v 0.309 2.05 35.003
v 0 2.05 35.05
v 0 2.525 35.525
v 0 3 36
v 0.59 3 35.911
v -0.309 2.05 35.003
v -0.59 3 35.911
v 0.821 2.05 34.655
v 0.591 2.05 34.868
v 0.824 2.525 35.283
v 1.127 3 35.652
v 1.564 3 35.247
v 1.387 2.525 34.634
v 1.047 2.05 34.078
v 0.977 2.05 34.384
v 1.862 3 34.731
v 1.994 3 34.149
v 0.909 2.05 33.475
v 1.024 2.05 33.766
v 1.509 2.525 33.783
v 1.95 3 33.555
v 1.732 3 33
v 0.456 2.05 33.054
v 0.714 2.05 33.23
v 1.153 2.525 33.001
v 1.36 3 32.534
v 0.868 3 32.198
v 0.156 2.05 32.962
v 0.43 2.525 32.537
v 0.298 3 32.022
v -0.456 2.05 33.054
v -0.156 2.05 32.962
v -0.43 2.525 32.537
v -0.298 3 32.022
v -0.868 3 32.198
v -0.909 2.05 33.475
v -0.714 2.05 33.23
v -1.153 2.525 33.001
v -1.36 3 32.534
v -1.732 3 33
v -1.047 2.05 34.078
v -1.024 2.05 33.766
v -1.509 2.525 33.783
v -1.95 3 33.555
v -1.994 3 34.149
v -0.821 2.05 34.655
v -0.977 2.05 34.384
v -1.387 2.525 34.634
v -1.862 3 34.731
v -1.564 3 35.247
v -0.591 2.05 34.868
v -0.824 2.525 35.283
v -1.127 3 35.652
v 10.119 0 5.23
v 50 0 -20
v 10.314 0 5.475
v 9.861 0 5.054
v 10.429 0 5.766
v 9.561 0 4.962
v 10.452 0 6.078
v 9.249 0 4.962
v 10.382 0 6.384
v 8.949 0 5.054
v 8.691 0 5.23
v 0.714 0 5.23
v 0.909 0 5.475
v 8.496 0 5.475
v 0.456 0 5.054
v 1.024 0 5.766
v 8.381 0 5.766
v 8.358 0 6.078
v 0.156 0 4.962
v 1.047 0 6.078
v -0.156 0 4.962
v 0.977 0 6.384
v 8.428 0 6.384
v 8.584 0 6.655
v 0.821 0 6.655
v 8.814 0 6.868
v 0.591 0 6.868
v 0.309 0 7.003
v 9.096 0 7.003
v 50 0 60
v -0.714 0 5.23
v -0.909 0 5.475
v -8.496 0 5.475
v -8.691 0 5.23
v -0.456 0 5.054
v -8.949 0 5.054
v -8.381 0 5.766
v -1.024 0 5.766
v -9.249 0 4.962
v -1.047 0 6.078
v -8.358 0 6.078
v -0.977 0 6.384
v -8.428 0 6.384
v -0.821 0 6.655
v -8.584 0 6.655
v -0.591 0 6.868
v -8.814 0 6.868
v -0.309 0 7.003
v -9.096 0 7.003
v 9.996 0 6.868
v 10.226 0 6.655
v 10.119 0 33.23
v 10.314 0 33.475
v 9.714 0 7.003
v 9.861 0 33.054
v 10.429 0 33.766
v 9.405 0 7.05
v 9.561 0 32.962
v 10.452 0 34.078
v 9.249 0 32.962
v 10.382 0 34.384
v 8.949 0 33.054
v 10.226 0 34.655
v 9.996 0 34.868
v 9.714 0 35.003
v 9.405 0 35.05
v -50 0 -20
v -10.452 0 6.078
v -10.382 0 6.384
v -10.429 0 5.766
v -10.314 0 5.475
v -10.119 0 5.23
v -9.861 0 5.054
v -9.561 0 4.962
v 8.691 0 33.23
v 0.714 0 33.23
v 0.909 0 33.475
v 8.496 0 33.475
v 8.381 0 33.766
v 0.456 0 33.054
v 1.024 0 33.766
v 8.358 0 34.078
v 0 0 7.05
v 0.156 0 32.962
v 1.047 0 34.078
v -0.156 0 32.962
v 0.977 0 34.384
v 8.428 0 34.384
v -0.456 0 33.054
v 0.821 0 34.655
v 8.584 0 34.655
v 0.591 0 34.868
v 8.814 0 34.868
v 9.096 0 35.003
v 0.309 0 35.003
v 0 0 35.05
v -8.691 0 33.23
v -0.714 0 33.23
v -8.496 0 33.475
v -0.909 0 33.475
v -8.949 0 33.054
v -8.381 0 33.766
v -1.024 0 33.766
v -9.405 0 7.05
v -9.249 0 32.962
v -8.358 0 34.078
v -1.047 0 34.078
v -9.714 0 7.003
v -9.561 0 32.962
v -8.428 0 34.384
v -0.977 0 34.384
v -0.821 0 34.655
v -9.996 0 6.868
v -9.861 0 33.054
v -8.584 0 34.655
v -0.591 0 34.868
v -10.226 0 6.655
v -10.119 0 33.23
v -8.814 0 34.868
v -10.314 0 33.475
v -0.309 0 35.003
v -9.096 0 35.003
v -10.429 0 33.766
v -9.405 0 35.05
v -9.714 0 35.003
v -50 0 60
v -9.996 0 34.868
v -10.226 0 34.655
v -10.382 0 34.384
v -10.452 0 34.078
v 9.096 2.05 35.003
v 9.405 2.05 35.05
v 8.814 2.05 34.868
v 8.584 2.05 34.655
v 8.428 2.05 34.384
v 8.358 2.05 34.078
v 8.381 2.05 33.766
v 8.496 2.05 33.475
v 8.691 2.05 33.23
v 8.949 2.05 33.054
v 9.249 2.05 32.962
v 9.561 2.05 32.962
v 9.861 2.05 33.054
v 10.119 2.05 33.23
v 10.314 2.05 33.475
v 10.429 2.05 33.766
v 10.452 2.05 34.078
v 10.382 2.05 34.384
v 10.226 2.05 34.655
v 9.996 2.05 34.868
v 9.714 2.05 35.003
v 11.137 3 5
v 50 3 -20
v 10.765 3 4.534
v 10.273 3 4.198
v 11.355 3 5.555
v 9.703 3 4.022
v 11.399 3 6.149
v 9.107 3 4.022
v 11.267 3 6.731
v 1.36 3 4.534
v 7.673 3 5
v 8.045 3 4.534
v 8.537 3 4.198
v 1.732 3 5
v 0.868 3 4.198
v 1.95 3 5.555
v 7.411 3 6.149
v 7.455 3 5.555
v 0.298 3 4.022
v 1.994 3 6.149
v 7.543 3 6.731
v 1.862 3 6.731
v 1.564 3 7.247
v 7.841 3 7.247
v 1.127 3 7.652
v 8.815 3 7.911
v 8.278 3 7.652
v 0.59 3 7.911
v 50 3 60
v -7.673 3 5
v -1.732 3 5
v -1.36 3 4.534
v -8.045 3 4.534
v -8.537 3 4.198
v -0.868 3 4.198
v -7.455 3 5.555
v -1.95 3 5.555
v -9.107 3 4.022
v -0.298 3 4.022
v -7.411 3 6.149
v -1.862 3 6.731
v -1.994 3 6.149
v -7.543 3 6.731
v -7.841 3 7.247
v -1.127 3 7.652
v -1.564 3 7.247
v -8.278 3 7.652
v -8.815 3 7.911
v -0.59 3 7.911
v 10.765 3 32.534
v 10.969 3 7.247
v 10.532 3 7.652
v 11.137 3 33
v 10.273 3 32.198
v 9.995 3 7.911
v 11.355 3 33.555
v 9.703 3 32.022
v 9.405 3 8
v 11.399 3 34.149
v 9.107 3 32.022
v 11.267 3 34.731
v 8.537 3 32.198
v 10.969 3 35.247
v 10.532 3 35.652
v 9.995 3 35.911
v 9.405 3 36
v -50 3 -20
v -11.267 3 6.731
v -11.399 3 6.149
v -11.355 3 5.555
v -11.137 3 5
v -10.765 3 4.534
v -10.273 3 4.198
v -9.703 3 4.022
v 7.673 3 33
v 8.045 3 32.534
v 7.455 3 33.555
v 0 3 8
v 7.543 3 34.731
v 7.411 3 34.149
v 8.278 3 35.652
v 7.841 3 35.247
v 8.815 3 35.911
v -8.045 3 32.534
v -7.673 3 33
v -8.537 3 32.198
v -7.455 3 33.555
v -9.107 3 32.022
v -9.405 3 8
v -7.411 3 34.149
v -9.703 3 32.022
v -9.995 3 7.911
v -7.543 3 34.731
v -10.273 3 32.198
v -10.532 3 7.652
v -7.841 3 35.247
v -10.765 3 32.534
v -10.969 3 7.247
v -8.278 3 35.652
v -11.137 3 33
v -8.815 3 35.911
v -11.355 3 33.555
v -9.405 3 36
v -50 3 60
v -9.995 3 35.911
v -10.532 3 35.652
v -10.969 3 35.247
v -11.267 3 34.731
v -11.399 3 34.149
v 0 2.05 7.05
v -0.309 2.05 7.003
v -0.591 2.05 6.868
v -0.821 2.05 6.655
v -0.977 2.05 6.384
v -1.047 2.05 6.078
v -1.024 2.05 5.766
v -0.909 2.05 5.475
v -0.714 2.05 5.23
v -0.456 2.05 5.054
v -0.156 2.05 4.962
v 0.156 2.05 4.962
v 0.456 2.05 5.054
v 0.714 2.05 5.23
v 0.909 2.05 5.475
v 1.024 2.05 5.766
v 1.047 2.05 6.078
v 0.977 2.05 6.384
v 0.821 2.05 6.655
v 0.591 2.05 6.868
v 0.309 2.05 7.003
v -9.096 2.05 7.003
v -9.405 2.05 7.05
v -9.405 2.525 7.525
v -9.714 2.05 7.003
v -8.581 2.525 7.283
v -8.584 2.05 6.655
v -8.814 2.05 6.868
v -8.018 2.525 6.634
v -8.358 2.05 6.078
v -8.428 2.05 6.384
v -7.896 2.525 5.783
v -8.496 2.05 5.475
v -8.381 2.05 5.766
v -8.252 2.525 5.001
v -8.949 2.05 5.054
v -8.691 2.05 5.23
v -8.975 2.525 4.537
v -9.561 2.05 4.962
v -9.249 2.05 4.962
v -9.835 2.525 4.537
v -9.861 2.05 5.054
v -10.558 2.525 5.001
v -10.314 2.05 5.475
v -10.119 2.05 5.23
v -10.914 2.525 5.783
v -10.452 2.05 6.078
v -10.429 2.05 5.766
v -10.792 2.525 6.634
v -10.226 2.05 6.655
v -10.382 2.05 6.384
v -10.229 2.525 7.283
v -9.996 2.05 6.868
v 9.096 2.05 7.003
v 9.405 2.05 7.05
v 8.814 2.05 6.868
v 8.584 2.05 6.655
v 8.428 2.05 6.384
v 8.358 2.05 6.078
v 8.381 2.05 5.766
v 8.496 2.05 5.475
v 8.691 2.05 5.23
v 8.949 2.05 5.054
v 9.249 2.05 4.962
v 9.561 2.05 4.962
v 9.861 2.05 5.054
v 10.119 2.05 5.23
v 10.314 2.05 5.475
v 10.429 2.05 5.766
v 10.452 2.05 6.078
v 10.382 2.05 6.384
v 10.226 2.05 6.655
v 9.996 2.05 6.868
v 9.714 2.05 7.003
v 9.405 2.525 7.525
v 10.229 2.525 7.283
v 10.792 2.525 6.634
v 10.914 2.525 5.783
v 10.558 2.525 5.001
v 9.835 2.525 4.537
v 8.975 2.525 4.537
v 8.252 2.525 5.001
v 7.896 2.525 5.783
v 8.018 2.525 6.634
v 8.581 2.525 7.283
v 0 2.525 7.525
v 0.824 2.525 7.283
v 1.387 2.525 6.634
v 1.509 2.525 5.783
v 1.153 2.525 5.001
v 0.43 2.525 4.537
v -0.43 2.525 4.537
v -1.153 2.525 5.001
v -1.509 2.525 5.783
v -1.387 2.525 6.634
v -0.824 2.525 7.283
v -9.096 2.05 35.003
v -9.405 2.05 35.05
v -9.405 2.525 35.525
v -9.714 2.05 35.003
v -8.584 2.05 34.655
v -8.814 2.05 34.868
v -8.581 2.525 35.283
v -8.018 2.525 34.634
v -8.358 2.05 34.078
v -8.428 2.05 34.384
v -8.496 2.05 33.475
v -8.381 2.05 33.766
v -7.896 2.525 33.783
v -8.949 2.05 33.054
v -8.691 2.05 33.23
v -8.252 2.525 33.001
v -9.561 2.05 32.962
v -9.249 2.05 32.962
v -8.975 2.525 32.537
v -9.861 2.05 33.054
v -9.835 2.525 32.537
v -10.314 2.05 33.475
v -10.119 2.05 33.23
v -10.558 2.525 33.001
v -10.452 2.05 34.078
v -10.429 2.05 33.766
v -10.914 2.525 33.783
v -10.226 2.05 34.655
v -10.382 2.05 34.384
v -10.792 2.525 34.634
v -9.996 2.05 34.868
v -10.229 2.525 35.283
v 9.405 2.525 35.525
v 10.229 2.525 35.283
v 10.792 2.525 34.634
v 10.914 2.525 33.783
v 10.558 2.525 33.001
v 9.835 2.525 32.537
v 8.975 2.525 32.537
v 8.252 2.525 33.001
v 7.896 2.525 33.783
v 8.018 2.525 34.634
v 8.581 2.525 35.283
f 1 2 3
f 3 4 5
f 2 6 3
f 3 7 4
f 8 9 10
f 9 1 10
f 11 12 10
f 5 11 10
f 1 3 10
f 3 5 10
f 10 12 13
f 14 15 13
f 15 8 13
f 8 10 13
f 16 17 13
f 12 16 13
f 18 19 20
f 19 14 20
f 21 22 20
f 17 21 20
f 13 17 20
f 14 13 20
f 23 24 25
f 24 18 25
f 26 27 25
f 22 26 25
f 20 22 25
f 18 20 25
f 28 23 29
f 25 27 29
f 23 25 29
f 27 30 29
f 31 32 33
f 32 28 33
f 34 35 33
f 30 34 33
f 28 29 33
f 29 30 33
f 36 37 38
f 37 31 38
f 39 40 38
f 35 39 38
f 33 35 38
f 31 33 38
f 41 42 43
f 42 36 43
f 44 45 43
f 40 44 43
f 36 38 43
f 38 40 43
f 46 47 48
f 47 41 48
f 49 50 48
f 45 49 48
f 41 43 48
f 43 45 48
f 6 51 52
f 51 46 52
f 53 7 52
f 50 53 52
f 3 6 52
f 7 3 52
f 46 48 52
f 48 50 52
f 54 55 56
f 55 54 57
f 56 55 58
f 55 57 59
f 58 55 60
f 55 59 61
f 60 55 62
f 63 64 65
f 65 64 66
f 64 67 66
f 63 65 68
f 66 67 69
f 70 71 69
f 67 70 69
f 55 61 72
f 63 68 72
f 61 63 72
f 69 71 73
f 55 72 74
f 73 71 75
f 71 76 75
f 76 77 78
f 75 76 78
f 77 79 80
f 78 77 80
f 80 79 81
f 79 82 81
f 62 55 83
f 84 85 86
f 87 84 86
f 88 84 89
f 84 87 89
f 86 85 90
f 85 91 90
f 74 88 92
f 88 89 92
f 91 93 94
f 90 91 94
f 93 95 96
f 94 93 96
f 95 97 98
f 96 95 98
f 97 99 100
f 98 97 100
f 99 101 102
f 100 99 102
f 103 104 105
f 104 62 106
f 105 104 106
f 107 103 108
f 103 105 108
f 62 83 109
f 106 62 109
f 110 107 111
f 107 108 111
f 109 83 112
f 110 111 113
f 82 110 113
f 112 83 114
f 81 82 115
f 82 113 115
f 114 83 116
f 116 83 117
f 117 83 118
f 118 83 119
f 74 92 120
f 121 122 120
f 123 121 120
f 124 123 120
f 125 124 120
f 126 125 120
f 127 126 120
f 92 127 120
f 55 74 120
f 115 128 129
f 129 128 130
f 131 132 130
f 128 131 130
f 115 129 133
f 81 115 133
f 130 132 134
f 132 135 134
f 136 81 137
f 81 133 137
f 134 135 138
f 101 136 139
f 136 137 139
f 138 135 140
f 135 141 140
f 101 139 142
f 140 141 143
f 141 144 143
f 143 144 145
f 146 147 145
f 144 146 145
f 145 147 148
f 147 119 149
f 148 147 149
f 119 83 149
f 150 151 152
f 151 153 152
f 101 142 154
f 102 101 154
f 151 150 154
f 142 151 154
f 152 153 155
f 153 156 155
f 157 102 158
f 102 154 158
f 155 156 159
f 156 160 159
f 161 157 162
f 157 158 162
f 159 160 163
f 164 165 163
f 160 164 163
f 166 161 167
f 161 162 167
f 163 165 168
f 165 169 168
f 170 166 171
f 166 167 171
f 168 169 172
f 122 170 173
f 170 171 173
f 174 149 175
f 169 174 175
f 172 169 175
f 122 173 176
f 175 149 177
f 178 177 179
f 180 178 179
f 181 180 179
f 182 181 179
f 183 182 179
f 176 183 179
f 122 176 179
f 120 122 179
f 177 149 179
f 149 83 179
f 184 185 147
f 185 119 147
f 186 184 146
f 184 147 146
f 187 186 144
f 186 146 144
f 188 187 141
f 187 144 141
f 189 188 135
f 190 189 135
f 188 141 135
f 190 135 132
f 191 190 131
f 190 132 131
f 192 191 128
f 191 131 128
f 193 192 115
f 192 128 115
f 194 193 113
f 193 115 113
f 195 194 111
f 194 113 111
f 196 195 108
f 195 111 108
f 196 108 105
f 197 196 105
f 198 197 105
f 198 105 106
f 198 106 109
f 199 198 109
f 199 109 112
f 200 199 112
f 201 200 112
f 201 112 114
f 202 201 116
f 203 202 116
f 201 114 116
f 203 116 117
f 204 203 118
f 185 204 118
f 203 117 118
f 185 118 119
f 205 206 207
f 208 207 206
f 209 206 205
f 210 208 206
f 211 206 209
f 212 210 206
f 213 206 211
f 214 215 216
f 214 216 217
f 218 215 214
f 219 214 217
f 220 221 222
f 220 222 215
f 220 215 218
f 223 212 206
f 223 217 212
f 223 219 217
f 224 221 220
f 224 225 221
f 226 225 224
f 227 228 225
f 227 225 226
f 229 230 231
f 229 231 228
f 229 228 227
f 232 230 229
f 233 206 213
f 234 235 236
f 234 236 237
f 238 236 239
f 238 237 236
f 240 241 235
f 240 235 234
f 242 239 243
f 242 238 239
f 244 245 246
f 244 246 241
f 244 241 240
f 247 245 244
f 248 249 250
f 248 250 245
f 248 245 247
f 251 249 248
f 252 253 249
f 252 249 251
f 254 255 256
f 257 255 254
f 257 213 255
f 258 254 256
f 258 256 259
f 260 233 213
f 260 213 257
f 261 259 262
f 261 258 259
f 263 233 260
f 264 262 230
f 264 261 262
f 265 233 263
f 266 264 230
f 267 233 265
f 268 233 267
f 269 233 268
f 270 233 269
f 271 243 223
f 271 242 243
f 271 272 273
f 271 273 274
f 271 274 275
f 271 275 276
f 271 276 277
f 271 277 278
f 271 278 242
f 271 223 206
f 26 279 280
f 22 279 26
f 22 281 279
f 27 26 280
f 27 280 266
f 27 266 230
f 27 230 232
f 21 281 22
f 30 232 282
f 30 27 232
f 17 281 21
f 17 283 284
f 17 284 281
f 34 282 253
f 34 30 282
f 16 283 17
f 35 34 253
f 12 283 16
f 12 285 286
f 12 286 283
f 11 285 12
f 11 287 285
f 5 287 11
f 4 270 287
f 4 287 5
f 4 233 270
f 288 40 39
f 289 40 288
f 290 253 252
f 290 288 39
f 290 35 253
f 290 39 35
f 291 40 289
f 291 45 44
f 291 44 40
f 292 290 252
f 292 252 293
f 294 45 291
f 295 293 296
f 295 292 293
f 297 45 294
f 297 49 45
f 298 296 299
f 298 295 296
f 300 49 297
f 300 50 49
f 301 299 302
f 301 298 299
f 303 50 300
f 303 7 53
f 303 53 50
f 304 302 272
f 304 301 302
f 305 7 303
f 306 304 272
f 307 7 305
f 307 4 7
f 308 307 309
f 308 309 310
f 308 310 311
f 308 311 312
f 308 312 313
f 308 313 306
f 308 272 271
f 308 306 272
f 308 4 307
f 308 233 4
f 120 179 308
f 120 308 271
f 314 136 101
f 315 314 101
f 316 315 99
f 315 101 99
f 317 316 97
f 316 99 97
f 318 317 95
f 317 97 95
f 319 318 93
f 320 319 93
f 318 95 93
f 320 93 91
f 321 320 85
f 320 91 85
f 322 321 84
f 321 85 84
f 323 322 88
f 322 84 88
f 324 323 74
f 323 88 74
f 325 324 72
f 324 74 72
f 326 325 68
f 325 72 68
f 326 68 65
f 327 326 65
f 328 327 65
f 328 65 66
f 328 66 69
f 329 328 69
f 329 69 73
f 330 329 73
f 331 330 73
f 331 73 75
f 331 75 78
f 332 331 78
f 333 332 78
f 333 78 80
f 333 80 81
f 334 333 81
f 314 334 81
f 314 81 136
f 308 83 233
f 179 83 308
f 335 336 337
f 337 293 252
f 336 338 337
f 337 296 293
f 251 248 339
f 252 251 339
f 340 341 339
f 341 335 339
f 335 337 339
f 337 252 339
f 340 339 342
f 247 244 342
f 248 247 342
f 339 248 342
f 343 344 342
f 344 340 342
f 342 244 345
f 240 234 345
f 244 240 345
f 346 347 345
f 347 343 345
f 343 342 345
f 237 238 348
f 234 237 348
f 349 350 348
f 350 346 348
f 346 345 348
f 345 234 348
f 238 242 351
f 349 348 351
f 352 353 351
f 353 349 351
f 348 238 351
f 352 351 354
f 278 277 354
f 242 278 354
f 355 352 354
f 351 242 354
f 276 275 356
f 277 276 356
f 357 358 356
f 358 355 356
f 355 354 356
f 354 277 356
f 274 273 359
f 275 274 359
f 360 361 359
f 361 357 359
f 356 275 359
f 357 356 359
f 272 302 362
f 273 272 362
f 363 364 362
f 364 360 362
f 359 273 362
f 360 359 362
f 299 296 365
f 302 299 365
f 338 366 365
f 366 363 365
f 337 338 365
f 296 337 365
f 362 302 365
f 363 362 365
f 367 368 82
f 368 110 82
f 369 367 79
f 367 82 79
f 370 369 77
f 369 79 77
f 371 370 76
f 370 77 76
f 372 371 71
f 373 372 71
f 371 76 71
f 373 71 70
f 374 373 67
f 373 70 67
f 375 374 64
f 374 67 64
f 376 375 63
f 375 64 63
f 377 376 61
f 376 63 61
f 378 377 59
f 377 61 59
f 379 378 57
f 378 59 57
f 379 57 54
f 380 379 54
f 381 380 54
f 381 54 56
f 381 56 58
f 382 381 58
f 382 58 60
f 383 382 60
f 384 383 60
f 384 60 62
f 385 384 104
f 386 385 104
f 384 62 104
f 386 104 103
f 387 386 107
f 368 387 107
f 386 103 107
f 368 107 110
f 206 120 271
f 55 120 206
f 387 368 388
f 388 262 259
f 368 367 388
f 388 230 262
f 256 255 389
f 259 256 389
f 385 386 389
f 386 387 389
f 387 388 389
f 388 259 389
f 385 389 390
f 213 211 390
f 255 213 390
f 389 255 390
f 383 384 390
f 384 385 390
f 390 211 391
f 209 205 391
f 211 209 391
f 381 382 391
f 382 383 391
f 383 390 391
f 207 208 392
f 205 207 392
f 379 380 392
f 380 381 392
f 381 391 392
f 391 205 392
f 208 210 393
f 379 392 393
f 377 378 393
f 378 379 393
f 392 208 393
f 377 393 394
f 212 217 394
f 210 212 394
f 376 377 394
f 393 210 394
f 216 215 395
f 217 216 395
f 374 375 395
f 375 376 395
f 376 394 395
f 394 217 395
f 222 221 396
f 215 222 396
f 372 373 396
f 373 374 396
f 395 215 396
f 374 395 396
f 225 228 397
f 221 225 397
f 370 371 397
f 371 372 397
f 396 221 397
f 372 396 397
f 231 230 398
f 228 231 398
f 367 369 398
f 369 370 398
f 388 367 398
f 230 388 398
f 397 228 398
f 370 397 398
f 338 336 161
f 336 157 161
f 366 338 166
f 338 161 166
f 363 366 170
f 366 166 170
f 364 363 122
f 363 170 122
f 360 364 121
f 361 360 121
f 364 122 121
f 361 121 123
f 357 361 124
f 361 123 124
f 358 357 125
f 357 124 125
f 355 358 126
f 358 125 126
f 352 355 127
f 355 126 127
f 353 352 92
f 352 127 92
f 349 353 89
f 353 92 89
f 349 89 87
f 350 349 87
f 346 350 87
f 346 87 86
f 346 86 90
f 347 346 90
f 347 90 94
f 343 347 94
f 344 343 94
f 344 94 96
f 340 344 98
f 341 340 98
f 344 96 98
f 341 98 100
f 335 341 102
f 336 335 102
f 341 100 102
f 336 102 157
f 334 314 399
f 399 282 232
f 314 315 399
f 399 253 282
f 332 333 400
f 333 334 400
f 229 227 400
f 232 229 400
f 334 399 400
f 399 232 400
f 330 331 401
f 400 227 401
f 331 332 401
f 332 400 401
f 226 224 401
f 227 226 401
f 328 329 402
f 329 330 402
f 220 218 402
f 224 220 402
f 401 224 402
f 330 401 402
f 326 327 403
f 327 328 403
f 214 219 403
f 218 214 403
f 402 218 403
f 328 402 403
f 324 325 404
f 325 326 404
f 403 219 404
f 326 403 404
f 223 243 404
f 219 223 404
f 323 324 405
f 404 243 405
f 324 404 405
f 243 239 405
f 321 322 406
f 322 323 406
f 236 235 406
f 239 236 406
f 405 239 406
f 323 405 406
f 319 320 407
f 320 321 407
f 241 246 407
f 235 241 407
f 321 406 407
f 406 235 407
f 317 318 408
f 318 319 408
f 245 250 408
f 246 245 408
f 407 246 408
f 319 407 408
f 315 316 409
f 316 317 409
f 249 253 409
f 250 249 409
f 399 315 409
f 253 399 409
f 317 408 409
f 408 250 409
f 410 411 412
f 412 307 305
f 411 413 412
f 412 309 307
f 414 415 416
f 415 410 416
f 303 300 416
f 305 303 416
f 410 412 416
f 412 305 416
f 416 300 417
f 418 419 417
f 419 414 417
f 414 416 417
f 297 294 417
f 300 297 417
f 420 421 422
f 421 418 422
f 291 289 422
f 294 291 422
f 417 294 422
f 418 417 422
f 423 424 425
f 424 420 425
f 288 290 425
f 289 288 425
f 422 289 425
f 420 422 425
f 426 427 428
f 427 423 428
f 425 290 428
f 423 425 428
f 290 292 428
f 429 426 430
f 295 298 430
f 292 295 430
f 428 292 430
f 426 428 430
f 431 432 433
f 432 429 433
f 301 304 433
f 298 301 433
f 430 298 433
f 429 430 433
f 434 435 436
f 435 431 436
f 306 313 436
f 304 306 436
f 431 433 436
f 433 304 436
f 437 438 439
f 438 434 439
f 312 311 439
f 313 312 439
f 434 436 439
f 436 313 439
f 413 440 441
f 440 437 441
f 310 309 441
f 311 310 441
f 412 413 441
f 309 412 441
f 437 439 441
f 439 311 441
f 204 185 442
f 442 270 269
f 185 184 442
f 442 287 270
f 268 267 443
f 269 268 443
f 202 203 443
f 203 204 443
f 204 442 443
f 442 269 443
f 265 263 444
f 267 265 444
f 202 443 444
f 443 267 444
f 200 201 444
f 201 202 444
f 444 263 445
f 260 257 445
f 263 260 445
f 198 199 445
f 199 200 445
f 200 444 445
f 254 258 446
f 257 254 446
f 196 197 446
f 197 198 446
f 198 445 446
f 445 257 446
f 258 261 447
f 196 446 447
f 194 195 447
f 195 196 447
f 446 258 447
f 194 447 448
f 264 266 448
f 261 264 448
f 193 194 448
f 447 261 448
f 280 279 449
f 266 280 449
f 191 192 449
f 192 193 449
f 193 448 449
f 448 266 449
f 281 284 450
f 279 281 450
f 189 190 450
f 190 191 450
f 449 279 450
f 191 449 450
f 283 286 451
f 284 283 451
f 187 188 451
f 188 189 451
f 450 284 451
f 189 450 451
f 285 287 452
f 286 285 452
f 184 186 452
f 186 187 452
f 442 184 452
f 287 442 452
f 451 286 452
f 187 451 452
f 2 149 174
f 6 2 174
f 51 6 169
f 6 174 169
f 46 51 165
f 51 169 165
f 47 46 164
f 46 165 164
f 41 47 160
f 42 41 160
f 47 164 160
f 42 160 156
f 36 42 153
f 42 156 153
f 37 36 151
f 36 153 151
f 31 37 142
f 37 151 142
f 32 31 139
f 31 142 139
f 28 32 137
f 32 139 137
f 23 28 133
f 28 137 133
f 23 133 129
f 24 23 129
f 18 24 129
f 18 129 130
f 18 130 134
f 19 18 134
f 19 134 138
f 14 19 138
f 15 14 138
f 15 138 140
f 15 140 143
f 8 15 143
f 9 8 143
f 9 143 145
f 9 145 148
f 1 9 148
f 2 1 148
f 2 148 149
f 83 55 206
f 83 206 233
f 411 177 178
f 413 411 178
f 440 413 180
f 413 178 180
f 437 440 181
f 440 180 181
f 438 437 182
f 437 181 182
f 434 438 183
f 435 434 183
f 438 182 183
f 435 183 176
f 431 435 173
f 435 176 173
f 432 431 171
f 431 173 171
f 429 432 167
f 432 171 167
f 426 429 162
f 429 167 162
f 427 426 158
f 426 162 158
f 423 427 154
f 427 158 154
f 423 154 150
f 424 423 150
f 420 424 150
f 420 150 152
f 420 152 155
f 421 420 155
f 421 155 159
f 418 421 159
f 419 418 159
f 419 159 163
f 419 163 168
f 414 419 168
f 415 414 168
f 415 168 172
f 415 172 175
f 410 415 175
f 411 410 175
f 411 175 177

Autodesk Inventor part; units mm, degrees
ref_plane "YZ Plane" through (0, 0, 0) normal (1, 0, 0) x (0, 1, 0)
ref_plane "XZ Plane" through (0, 0, 0) normal (0, 1, 0) x (-1, 0, 0)
ref_plane "XY Plane" through (0, 0, 0) normal (0, 0, 1) x (1, 0, 0)
sketch "Sketch1" plane through (0, 0, 0) normal (0, 1, 0) x (-1, 0, 0)
  line L0 (50, -20) -> (-50, -20)
  line L1 (-50, -20) -> (-50, 60)
  line L2 (-50, 60) -> (50, 60)
  line L3 (50, 60) -> (50, -20)
  point P0 (0, 0)
  dimension "d0" = 100
  dimension "d1" = 80
  dimension "d2" = 20
  dimension "d3" = 50
extrude "Plate1" add sketch "Sketch1" along normal blind 3
sketch "Sketch3" plane through (0, 3, 0) normal (0, 1, 0) x (1, 0, 0)
  circle A0 centre (9.405, -34) radius 1.05 projected
  circle A1 centre (9.405, -6) radius 1.05 projected
  circle A2 centre (0, -34) radius 1.05 projected
  circle A3 centre (0, -6) radius 1.05 projected
  circle A4 centre (-9.405, -34) radius 1.05 projected
  circle A5 centre (-9.405, -6) radius 1.05 projected
  line L0 (15.405, 0) -> (15.405, -40) projected
  line L1 (-15.405, -40) -> (15.405, -40) projected
  line L2 (-15.405, -40) -> (-15.405, 0) projected
  line L3 (15.405, 0) -> (-15.405, 0) projected
  point P0 (0, 0)
hole "Hole1" at (-9.405, 3, 6) at (0, 3, 6) at (9.405, 3, 6) at (9.405, 3, 34) at (0, 3, 34) at (-9.405, 3, 34) direction (0, -1, 0) diameter 2.1 depth 3 countersink diameter 4 countersink angle 90
equation "\"d20\" = Thickness"
equation "\"d4\" = Thickness"
equation "\"BendReliefWidth\" = Thickness"
equation "\"BendReliefDepth\" = 0.5 * Thickness"
equation "\"CornerReliefSize\" = 4 * Thickness"
equation "\"MinimumRemnant\" = 2 * Thickness"
equation "\"TransitionRadius\" = BendRadius"
equation "\"JacobiRadiusSize\" = BendRadius"
equation "\"GapSize\" = Thickness"
equation "\"Thickness\" = 3"
equation "\"BendRadius\" = 0.31"
properties part number "axis_12_bottom_frame(bottom)" material "Aluminum 6061-AHC"
